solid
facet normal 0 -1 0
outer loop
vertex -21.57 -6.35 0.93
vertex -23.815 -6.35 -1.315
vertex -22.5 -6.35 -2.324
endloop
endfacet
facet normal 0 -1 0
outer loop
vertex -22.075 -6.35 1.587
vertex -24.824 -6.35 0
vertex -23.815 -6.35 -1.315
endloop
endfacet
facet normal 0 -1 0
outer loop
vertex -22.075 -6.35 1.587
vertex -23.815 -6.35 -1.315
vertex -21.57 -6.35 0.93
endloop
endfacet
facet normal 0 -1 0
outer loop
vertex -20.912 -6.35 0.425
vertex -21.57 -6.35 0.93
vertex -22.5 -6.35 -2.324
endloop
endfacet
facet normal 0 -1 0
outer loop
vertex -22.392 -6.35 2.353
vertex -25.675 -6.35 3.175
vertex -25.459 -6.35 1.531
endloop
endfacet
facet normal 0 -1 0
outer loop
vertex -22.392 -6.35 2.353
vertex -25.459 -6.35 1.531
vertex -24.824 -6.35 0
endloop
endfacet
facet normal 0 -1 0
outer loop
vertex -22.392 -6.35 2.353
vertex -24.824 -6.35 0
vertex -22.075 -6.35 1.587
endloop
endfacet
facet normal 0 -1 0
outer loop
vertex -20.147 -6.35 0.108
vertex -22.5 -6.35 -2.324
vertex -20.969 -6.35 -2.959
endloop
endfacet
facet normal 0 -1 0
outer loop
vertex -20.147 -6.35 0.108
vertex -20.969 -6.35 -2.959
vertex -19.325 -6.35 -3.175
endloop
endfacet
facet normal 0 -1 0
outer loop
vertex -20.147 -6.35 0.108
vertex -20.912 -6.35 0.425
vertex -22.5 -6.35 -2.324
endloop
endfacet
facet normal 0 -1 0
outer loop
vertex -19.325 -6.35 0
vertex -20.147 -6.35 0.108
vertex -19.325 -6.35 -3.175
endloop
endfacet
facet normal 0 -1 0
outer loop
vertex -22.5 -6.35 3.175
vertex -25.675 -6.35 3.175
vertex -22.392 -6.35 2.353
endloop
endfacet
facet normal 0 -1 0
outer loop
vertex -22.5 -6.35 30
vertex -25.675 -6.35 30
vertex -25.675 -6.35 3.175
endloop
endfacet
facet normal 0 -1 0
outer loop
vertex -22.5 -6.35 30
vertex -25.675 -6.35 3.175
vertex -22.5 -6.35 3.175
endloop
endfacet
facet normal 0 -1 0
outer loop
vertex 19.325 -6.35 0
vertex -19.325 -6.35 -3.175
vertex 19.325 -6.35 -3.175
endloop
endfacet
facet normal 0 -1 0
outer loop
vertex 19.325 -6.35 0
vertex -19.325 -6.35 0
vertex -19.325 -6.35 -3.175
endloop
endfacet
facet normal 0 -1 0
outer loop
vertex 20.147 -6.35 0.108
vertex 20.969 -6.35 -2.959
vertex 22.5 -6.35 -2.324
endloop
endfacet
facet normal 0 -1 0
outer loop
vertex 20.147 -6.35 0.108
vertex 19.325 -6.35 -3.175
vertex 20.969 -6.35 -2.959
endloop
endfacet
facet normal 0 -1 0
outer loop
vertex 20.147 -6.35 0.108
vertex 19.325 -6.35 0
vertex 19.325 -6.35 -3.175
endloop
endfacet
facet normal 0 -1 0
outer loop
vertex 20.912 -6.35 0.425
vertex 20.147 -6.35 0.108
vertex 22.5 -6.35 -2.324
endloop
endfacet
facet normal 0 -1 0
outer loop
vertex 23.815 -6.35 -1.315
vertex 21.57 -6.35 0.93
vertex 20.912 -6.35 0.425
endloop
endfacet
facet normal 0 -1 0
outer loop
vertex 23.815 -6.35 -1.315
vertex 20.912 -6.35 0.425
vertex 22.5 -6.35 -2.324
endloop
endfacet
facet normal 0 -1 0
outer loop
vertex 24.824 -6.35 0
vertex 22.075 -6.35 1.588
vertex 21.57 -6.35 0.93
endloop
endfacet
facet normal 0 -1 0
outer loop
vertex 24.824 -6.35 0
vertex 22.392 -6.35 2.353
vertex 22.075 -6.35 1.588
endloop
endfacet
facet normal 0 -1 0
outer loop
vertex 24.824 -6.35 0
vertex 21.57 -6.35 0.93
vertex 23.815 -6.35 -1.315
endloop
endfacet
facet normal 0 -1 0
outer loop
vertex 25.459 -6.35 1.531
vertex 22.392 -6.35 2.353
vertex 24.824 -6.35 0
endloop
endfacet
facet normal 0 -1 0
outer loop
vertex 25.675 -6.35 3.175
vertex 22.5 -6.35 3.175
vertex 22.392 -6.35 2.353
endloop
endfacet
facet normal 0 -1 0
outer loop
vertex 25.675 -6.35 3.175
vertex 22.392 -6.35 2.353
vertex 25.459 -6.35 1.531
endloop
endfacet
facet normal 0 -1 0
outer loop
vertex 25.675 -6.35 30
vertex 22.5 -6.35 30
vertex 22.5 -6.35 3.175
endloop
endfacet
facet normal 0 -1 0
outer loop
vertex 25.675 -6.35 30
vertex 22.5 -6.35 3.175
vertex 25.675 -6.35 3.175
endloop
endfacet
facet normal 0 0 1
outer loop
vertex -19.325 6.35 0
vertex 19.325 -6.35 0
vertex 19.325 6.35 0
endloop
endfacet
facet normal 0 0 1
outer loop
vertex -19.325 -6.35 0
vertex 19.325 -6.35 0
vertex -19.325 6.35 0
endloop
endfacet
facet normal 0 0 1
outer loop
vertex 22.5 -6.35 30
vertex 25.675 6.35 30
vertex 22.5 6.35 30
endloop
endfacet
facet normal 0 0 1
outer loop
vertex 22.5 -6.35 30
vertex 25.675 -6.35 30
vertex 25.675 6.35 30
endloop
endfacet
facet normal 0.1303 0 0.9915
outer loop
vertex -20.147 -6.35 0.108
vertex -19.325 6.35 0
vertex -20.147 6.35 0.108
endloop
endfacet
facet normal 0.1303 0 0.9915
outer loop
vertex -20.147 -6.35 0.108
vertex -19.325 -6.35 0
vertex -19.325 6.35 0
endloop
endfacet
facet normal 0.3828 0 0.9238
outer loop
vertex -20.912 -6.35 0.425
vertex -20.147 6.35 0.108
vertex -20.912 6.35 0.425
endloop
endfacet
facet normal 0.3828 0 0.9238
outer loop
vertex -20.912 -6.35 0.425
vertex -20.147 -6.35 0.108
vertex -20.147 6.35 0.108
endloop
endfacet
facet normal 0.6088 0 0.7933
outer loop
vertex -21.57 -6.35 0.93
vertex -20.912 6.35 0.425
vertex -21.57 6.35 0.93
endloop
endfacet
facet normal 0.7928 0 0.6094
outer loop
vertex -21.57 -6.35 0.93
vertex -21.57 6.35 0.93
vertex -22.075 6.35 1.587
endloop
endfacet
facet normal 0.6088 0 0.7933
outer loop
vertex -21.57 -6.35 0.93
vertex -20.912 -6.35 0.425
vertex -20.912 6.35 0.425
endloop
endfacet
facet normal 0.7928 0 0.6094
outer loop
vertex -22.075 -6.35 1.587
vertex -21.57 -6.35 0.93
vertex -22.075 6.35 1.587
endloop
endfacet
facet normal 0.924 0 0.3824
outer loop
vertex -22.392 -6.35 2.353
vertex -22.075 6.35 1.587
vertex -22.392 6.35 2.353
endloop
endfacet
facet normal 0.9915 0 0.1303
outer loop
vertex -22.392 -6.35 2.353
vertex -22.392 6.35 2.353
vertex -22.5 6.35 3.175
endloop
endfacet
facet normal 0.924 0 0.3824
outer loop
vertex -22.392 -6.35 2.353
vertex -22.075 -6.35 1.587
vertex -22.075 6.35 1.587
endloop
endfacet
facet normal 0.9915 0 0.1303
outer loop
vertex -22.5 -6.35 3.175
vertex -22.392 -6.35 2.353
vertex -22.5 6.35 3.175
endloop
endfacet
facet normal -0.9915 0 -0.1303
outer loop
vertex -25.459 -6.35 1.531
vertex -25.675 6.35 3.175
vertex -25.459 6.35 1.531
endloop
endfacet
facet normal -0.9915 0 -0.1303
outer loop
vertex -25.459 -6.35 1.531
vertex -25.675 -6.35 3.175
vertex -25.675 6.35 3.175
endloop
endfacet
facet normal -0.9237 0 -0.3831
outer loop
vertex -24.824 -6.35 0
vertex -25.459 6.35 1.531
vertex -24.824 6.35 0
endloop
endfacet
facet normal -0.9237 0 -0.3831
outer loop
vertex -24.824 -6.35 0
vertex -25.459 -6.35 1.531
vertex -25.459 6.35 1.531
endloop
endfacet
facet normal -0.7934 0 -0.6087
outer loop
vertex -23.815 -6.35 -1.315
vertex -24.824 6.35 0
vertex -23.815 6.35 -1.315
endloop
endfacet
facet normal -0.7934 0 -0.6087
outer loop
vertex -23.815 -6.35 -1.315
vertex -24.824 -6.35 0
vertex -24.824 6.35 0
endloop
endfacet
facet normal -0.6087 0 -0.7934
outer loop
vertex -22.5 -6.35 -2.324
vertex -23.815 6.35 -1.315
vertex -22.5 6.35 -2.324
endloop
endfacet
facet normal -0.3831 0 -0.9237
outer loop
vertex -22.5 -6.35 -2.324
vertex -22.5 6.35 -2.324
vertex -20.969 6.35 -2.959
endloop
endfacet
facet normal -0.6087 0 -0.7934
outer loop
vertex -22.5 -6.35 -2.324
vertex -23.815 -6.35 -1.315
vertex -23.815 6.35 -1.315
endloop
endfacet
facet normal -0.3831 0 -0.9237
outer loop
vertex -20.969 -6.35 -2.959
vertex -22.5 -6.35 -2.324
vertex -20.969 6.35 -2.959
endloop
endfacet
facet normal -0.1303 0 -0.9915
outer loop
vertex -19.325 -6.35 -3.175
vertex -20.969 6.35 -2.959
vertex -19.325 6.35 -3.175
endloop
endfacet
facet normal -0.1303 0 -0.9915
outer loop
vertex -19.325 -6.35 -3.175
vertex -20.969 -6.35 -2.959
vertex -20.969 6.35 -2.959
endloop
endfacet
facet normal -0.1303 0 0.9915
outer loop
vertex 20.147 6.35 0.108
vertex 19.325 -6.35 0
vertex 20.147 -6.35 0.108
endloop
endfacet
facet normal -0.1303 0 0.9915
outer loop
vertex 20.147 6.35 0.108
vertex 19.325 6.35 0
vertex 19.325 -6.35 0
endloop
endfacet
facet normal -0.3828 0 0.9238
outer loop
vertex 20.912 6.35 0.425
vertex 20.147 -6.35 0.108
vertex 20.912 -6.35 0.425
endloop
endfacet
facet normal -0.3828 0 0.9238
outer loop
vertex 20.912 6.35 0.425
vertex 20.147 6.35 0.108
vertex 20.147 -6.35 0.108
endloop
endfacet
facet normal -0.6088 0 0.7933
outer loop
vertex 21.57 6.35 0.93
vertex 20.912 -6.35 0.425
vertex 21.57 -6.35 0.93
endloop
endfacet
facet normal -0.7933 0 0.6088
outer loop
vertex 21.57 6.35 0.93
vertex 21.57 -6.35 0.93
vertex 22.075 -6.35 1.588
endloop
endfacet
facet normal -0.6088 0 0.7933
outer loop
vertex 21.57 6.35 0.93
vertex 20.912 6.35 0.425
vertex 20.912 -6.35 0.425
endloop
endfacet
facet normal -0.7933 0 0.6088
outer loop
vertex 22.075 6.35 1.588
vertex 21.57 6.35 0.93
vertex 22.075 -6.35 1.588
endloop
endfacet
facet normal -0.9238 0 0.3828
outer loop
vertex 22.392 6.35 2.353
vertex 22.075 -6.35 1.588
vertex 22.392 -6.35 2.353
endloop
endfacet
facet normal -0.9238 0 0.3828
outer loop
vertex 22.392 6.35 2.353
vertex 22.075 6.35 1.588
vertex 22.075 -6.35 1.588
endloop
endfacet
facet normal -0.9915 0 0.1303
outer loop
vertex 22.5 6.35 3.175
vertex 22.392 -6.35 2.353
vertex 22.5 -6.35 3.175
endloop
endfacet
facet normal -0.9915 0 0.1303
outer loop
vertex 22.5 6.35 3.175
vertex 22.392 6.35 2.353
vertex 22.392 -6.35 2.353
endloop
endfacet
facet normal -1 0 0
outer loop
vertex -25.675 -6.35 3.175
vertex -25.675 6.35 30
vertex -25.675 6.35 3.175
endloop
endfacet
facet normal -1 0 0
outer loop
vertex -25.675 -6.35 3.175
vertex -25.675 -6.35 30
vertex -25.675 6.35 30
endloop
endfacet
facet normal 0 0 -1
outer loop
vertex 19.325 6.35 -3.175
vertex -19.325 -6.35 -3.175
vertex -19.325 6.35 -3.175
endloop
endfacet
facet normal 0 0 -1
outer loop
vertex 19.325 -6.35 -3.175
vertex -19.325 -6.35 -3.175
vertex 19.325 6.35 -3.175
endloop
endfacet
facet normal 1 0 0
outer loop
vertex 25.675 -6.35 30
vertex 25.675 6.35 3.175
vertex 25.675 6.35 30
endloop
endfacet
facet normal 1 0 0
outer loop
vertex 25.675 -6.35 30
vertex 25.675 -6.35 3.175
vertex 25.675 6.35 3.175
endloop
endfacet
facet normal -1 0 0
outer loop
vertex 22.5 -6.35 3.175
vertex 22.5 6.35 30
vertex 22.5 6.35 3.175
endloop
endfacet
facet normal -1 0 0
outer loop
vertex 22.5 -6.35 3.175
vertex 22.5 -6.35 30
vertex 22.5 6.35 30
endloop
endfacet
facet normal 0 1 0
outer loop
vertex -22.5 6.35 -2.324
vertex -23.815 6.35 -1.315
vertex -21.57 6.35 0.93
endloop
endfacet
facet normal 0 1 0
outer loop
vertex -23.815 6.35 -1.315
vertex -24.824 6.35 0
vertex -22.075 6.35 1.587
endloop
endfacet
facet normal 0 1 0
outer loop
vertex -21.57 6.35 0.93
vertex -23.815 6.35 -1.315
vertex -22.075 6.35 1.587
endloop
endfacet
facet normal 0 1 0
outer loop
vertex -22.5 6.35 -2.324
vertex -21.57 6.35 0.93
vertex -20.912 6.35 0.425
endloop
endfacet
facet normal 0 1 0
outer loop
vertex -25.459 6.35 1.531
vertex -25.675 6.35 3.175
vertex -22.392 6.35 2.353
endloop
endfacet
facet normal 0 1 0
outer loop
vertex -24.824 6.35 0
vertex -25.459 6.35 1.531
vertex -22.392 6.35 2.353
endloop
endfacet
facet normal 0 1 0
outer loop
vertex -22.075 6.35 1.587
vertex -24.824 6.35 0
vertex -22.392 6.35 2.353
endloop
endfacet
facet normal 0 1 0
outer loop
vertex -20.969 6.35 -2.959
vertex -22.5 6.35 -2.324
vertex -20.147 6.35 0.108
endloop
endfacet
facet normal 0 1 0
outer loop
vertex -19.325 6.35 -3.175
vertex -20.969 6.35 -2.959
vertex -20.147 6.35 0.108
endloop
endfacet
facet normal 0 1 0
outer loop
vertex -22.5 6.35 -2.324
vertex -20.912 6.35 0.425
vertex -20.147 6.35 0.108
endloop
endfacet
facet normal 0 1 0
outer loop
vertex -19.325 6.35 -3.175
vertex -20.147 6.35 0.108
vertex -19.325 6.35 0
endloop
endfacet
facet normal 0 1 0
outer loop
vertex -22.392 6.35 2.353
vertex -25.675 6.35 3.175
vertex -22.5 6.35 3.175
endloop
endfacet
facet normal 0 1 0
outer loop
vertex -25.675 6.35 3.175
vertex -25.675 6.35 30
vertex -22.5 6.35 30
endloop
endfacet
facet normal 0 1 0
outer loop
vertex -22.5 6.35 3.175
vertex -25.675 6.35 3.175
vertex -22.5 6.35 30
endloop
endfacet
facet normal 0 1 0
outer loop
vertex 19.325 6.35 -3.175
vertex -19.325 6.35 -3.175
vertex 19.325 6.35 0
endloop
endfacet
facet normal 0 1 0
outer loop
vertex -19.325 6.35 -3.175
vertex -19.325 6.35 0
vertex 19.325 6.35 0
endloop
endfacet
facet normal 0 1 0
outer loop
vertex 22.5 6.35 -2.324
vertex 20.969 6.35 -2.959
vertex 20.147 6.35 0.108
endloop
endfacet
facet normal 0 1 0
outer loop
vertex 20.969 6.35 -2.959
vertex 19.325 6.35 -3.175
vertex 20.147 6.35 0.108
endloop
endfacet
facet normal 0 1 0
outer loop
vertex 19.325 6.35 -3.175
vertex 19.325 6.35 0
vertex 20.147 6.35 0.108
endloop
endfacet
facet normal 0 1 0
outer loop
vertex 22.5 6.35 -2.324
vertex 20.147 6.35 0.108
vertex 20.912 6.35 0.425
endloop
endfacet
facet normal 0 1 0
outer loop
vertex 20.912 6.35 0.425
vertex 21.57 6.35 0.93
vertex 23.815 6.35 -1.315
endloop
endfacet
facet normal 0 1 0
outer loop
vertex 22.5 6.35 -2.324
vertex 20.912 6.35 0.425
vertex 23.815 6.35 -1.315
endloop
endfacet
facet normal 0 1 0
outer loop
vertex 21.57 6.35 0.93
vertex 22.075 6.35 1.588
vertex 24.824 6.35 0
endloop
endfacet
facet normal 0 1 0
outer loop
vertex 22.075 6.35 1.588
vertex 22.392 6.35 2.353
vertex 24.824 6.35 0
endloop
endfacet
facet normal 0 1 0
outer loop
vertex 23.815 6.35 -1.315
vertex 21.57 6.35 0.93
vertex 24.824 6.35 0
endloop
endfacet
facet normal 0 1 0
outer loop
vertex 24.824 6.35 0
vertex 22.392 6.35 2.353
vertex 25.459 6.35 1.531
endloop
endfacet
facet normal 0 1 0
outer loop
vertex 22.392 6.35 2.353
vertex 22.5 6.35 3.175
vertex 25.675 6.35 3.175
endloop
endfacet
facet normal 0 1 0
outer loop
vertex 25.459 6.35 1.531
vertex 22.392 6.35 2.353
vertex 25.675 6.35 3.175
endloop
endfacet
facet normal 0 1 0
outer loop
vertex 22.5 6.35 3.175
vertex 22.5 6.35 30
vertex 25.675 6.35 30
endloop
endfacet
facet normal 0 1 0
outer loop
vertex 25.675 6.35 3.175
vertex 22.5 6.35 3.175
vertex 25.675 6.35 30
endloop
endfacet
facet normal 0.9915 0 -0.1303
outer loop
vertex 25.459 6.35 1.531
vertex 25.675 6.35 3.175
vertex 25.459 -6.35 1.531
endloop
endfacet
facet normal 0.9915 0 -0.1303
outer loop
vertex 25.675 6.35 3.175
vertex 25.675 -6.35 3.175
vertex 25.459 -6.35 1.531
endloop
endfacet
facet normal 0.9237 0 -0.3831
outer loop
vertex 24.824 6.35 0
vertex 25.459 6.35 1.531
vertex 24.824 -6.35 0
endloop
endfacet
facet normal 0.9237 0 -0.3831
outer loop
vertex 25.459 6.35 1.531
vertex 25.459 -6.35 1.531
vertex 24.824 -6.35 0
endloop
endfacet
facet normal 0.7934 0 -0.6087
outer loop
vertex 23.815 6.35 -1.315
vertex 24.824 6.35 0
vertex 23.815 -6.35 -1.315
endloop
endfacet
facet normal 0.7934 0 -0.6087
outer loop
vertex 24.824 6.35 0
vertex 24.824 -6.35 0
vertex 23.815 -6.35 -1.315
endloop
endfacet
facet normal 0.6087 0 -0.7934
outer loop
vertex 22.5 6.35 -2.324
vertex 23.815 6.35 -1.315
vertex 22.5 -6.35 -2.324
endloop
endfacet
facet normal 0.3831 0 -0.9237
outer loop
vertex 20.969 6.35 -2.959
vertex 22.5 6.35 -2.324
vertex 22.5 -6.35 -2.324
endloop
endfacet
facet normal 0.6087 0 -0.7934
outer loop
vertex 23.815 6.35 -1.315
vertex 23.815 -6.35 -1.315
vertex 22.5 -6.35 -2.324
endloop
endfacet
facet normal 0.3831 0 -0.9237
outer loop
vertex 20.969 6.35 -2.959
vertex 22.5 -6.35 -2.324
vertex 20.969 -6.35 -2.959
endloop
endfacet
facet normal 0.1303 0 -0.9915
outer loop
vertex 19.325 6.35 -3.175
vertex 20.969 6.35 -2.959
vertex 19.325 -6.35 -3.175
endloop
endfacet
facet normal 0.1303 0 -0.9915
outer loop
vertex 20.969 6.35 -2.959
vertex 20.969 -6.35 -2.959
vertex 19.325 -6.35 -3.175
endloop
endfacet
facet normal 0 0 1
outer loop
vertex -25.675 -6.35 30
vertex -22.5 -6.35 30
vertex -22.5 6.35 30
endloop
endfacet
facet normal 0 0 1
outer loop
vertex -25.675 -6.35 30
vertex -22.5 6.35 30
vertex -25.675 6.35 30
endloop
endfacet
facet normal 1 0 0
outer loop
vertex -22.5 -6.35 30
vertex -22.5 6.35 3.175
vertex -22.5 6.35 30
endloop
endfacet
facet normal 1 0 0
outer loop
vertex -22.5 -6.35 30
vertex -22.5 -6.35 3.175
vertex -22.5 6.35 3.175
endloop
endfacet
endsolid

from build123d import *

# Parameters (mm, degrees)
F1_DEPTH = 6.35
F2_R     = 3.175
F3_R     = 6.35


with BuildPart() as f1:
    # F0 (on Front) → F1 (new body, symmetric)
    with BuildSketch(Plane.XZ):
        Polygon((22.5, 0), (0, 0), (-22.5, 0), (-22.5, 30), (-25.675, 30), (-25.675, -3.175), (0, -3.175), (25.675, -3.175), (25.675, 30), (22.5, 30), align=None)
    extrude(amount=F1_DEPTH, both=True)

    # F2
    f2_edges = [f1.edges().sort_by_distance(p)[0] for p in [
        (22.5, 0, 0),
        (-22.5, 0, 0),
    ]]
    fillet(f2_edges, radius=F2_R)

    # F3
    f3_edges = [f1.edges().sort_by_distance(p)[0] for p in [
        (-25.675, 0, -3.175),
        (25.675, 0, -3.175),
    ]]
    fillet(f3_edges, radius=F3_R)


solid = f1.part
